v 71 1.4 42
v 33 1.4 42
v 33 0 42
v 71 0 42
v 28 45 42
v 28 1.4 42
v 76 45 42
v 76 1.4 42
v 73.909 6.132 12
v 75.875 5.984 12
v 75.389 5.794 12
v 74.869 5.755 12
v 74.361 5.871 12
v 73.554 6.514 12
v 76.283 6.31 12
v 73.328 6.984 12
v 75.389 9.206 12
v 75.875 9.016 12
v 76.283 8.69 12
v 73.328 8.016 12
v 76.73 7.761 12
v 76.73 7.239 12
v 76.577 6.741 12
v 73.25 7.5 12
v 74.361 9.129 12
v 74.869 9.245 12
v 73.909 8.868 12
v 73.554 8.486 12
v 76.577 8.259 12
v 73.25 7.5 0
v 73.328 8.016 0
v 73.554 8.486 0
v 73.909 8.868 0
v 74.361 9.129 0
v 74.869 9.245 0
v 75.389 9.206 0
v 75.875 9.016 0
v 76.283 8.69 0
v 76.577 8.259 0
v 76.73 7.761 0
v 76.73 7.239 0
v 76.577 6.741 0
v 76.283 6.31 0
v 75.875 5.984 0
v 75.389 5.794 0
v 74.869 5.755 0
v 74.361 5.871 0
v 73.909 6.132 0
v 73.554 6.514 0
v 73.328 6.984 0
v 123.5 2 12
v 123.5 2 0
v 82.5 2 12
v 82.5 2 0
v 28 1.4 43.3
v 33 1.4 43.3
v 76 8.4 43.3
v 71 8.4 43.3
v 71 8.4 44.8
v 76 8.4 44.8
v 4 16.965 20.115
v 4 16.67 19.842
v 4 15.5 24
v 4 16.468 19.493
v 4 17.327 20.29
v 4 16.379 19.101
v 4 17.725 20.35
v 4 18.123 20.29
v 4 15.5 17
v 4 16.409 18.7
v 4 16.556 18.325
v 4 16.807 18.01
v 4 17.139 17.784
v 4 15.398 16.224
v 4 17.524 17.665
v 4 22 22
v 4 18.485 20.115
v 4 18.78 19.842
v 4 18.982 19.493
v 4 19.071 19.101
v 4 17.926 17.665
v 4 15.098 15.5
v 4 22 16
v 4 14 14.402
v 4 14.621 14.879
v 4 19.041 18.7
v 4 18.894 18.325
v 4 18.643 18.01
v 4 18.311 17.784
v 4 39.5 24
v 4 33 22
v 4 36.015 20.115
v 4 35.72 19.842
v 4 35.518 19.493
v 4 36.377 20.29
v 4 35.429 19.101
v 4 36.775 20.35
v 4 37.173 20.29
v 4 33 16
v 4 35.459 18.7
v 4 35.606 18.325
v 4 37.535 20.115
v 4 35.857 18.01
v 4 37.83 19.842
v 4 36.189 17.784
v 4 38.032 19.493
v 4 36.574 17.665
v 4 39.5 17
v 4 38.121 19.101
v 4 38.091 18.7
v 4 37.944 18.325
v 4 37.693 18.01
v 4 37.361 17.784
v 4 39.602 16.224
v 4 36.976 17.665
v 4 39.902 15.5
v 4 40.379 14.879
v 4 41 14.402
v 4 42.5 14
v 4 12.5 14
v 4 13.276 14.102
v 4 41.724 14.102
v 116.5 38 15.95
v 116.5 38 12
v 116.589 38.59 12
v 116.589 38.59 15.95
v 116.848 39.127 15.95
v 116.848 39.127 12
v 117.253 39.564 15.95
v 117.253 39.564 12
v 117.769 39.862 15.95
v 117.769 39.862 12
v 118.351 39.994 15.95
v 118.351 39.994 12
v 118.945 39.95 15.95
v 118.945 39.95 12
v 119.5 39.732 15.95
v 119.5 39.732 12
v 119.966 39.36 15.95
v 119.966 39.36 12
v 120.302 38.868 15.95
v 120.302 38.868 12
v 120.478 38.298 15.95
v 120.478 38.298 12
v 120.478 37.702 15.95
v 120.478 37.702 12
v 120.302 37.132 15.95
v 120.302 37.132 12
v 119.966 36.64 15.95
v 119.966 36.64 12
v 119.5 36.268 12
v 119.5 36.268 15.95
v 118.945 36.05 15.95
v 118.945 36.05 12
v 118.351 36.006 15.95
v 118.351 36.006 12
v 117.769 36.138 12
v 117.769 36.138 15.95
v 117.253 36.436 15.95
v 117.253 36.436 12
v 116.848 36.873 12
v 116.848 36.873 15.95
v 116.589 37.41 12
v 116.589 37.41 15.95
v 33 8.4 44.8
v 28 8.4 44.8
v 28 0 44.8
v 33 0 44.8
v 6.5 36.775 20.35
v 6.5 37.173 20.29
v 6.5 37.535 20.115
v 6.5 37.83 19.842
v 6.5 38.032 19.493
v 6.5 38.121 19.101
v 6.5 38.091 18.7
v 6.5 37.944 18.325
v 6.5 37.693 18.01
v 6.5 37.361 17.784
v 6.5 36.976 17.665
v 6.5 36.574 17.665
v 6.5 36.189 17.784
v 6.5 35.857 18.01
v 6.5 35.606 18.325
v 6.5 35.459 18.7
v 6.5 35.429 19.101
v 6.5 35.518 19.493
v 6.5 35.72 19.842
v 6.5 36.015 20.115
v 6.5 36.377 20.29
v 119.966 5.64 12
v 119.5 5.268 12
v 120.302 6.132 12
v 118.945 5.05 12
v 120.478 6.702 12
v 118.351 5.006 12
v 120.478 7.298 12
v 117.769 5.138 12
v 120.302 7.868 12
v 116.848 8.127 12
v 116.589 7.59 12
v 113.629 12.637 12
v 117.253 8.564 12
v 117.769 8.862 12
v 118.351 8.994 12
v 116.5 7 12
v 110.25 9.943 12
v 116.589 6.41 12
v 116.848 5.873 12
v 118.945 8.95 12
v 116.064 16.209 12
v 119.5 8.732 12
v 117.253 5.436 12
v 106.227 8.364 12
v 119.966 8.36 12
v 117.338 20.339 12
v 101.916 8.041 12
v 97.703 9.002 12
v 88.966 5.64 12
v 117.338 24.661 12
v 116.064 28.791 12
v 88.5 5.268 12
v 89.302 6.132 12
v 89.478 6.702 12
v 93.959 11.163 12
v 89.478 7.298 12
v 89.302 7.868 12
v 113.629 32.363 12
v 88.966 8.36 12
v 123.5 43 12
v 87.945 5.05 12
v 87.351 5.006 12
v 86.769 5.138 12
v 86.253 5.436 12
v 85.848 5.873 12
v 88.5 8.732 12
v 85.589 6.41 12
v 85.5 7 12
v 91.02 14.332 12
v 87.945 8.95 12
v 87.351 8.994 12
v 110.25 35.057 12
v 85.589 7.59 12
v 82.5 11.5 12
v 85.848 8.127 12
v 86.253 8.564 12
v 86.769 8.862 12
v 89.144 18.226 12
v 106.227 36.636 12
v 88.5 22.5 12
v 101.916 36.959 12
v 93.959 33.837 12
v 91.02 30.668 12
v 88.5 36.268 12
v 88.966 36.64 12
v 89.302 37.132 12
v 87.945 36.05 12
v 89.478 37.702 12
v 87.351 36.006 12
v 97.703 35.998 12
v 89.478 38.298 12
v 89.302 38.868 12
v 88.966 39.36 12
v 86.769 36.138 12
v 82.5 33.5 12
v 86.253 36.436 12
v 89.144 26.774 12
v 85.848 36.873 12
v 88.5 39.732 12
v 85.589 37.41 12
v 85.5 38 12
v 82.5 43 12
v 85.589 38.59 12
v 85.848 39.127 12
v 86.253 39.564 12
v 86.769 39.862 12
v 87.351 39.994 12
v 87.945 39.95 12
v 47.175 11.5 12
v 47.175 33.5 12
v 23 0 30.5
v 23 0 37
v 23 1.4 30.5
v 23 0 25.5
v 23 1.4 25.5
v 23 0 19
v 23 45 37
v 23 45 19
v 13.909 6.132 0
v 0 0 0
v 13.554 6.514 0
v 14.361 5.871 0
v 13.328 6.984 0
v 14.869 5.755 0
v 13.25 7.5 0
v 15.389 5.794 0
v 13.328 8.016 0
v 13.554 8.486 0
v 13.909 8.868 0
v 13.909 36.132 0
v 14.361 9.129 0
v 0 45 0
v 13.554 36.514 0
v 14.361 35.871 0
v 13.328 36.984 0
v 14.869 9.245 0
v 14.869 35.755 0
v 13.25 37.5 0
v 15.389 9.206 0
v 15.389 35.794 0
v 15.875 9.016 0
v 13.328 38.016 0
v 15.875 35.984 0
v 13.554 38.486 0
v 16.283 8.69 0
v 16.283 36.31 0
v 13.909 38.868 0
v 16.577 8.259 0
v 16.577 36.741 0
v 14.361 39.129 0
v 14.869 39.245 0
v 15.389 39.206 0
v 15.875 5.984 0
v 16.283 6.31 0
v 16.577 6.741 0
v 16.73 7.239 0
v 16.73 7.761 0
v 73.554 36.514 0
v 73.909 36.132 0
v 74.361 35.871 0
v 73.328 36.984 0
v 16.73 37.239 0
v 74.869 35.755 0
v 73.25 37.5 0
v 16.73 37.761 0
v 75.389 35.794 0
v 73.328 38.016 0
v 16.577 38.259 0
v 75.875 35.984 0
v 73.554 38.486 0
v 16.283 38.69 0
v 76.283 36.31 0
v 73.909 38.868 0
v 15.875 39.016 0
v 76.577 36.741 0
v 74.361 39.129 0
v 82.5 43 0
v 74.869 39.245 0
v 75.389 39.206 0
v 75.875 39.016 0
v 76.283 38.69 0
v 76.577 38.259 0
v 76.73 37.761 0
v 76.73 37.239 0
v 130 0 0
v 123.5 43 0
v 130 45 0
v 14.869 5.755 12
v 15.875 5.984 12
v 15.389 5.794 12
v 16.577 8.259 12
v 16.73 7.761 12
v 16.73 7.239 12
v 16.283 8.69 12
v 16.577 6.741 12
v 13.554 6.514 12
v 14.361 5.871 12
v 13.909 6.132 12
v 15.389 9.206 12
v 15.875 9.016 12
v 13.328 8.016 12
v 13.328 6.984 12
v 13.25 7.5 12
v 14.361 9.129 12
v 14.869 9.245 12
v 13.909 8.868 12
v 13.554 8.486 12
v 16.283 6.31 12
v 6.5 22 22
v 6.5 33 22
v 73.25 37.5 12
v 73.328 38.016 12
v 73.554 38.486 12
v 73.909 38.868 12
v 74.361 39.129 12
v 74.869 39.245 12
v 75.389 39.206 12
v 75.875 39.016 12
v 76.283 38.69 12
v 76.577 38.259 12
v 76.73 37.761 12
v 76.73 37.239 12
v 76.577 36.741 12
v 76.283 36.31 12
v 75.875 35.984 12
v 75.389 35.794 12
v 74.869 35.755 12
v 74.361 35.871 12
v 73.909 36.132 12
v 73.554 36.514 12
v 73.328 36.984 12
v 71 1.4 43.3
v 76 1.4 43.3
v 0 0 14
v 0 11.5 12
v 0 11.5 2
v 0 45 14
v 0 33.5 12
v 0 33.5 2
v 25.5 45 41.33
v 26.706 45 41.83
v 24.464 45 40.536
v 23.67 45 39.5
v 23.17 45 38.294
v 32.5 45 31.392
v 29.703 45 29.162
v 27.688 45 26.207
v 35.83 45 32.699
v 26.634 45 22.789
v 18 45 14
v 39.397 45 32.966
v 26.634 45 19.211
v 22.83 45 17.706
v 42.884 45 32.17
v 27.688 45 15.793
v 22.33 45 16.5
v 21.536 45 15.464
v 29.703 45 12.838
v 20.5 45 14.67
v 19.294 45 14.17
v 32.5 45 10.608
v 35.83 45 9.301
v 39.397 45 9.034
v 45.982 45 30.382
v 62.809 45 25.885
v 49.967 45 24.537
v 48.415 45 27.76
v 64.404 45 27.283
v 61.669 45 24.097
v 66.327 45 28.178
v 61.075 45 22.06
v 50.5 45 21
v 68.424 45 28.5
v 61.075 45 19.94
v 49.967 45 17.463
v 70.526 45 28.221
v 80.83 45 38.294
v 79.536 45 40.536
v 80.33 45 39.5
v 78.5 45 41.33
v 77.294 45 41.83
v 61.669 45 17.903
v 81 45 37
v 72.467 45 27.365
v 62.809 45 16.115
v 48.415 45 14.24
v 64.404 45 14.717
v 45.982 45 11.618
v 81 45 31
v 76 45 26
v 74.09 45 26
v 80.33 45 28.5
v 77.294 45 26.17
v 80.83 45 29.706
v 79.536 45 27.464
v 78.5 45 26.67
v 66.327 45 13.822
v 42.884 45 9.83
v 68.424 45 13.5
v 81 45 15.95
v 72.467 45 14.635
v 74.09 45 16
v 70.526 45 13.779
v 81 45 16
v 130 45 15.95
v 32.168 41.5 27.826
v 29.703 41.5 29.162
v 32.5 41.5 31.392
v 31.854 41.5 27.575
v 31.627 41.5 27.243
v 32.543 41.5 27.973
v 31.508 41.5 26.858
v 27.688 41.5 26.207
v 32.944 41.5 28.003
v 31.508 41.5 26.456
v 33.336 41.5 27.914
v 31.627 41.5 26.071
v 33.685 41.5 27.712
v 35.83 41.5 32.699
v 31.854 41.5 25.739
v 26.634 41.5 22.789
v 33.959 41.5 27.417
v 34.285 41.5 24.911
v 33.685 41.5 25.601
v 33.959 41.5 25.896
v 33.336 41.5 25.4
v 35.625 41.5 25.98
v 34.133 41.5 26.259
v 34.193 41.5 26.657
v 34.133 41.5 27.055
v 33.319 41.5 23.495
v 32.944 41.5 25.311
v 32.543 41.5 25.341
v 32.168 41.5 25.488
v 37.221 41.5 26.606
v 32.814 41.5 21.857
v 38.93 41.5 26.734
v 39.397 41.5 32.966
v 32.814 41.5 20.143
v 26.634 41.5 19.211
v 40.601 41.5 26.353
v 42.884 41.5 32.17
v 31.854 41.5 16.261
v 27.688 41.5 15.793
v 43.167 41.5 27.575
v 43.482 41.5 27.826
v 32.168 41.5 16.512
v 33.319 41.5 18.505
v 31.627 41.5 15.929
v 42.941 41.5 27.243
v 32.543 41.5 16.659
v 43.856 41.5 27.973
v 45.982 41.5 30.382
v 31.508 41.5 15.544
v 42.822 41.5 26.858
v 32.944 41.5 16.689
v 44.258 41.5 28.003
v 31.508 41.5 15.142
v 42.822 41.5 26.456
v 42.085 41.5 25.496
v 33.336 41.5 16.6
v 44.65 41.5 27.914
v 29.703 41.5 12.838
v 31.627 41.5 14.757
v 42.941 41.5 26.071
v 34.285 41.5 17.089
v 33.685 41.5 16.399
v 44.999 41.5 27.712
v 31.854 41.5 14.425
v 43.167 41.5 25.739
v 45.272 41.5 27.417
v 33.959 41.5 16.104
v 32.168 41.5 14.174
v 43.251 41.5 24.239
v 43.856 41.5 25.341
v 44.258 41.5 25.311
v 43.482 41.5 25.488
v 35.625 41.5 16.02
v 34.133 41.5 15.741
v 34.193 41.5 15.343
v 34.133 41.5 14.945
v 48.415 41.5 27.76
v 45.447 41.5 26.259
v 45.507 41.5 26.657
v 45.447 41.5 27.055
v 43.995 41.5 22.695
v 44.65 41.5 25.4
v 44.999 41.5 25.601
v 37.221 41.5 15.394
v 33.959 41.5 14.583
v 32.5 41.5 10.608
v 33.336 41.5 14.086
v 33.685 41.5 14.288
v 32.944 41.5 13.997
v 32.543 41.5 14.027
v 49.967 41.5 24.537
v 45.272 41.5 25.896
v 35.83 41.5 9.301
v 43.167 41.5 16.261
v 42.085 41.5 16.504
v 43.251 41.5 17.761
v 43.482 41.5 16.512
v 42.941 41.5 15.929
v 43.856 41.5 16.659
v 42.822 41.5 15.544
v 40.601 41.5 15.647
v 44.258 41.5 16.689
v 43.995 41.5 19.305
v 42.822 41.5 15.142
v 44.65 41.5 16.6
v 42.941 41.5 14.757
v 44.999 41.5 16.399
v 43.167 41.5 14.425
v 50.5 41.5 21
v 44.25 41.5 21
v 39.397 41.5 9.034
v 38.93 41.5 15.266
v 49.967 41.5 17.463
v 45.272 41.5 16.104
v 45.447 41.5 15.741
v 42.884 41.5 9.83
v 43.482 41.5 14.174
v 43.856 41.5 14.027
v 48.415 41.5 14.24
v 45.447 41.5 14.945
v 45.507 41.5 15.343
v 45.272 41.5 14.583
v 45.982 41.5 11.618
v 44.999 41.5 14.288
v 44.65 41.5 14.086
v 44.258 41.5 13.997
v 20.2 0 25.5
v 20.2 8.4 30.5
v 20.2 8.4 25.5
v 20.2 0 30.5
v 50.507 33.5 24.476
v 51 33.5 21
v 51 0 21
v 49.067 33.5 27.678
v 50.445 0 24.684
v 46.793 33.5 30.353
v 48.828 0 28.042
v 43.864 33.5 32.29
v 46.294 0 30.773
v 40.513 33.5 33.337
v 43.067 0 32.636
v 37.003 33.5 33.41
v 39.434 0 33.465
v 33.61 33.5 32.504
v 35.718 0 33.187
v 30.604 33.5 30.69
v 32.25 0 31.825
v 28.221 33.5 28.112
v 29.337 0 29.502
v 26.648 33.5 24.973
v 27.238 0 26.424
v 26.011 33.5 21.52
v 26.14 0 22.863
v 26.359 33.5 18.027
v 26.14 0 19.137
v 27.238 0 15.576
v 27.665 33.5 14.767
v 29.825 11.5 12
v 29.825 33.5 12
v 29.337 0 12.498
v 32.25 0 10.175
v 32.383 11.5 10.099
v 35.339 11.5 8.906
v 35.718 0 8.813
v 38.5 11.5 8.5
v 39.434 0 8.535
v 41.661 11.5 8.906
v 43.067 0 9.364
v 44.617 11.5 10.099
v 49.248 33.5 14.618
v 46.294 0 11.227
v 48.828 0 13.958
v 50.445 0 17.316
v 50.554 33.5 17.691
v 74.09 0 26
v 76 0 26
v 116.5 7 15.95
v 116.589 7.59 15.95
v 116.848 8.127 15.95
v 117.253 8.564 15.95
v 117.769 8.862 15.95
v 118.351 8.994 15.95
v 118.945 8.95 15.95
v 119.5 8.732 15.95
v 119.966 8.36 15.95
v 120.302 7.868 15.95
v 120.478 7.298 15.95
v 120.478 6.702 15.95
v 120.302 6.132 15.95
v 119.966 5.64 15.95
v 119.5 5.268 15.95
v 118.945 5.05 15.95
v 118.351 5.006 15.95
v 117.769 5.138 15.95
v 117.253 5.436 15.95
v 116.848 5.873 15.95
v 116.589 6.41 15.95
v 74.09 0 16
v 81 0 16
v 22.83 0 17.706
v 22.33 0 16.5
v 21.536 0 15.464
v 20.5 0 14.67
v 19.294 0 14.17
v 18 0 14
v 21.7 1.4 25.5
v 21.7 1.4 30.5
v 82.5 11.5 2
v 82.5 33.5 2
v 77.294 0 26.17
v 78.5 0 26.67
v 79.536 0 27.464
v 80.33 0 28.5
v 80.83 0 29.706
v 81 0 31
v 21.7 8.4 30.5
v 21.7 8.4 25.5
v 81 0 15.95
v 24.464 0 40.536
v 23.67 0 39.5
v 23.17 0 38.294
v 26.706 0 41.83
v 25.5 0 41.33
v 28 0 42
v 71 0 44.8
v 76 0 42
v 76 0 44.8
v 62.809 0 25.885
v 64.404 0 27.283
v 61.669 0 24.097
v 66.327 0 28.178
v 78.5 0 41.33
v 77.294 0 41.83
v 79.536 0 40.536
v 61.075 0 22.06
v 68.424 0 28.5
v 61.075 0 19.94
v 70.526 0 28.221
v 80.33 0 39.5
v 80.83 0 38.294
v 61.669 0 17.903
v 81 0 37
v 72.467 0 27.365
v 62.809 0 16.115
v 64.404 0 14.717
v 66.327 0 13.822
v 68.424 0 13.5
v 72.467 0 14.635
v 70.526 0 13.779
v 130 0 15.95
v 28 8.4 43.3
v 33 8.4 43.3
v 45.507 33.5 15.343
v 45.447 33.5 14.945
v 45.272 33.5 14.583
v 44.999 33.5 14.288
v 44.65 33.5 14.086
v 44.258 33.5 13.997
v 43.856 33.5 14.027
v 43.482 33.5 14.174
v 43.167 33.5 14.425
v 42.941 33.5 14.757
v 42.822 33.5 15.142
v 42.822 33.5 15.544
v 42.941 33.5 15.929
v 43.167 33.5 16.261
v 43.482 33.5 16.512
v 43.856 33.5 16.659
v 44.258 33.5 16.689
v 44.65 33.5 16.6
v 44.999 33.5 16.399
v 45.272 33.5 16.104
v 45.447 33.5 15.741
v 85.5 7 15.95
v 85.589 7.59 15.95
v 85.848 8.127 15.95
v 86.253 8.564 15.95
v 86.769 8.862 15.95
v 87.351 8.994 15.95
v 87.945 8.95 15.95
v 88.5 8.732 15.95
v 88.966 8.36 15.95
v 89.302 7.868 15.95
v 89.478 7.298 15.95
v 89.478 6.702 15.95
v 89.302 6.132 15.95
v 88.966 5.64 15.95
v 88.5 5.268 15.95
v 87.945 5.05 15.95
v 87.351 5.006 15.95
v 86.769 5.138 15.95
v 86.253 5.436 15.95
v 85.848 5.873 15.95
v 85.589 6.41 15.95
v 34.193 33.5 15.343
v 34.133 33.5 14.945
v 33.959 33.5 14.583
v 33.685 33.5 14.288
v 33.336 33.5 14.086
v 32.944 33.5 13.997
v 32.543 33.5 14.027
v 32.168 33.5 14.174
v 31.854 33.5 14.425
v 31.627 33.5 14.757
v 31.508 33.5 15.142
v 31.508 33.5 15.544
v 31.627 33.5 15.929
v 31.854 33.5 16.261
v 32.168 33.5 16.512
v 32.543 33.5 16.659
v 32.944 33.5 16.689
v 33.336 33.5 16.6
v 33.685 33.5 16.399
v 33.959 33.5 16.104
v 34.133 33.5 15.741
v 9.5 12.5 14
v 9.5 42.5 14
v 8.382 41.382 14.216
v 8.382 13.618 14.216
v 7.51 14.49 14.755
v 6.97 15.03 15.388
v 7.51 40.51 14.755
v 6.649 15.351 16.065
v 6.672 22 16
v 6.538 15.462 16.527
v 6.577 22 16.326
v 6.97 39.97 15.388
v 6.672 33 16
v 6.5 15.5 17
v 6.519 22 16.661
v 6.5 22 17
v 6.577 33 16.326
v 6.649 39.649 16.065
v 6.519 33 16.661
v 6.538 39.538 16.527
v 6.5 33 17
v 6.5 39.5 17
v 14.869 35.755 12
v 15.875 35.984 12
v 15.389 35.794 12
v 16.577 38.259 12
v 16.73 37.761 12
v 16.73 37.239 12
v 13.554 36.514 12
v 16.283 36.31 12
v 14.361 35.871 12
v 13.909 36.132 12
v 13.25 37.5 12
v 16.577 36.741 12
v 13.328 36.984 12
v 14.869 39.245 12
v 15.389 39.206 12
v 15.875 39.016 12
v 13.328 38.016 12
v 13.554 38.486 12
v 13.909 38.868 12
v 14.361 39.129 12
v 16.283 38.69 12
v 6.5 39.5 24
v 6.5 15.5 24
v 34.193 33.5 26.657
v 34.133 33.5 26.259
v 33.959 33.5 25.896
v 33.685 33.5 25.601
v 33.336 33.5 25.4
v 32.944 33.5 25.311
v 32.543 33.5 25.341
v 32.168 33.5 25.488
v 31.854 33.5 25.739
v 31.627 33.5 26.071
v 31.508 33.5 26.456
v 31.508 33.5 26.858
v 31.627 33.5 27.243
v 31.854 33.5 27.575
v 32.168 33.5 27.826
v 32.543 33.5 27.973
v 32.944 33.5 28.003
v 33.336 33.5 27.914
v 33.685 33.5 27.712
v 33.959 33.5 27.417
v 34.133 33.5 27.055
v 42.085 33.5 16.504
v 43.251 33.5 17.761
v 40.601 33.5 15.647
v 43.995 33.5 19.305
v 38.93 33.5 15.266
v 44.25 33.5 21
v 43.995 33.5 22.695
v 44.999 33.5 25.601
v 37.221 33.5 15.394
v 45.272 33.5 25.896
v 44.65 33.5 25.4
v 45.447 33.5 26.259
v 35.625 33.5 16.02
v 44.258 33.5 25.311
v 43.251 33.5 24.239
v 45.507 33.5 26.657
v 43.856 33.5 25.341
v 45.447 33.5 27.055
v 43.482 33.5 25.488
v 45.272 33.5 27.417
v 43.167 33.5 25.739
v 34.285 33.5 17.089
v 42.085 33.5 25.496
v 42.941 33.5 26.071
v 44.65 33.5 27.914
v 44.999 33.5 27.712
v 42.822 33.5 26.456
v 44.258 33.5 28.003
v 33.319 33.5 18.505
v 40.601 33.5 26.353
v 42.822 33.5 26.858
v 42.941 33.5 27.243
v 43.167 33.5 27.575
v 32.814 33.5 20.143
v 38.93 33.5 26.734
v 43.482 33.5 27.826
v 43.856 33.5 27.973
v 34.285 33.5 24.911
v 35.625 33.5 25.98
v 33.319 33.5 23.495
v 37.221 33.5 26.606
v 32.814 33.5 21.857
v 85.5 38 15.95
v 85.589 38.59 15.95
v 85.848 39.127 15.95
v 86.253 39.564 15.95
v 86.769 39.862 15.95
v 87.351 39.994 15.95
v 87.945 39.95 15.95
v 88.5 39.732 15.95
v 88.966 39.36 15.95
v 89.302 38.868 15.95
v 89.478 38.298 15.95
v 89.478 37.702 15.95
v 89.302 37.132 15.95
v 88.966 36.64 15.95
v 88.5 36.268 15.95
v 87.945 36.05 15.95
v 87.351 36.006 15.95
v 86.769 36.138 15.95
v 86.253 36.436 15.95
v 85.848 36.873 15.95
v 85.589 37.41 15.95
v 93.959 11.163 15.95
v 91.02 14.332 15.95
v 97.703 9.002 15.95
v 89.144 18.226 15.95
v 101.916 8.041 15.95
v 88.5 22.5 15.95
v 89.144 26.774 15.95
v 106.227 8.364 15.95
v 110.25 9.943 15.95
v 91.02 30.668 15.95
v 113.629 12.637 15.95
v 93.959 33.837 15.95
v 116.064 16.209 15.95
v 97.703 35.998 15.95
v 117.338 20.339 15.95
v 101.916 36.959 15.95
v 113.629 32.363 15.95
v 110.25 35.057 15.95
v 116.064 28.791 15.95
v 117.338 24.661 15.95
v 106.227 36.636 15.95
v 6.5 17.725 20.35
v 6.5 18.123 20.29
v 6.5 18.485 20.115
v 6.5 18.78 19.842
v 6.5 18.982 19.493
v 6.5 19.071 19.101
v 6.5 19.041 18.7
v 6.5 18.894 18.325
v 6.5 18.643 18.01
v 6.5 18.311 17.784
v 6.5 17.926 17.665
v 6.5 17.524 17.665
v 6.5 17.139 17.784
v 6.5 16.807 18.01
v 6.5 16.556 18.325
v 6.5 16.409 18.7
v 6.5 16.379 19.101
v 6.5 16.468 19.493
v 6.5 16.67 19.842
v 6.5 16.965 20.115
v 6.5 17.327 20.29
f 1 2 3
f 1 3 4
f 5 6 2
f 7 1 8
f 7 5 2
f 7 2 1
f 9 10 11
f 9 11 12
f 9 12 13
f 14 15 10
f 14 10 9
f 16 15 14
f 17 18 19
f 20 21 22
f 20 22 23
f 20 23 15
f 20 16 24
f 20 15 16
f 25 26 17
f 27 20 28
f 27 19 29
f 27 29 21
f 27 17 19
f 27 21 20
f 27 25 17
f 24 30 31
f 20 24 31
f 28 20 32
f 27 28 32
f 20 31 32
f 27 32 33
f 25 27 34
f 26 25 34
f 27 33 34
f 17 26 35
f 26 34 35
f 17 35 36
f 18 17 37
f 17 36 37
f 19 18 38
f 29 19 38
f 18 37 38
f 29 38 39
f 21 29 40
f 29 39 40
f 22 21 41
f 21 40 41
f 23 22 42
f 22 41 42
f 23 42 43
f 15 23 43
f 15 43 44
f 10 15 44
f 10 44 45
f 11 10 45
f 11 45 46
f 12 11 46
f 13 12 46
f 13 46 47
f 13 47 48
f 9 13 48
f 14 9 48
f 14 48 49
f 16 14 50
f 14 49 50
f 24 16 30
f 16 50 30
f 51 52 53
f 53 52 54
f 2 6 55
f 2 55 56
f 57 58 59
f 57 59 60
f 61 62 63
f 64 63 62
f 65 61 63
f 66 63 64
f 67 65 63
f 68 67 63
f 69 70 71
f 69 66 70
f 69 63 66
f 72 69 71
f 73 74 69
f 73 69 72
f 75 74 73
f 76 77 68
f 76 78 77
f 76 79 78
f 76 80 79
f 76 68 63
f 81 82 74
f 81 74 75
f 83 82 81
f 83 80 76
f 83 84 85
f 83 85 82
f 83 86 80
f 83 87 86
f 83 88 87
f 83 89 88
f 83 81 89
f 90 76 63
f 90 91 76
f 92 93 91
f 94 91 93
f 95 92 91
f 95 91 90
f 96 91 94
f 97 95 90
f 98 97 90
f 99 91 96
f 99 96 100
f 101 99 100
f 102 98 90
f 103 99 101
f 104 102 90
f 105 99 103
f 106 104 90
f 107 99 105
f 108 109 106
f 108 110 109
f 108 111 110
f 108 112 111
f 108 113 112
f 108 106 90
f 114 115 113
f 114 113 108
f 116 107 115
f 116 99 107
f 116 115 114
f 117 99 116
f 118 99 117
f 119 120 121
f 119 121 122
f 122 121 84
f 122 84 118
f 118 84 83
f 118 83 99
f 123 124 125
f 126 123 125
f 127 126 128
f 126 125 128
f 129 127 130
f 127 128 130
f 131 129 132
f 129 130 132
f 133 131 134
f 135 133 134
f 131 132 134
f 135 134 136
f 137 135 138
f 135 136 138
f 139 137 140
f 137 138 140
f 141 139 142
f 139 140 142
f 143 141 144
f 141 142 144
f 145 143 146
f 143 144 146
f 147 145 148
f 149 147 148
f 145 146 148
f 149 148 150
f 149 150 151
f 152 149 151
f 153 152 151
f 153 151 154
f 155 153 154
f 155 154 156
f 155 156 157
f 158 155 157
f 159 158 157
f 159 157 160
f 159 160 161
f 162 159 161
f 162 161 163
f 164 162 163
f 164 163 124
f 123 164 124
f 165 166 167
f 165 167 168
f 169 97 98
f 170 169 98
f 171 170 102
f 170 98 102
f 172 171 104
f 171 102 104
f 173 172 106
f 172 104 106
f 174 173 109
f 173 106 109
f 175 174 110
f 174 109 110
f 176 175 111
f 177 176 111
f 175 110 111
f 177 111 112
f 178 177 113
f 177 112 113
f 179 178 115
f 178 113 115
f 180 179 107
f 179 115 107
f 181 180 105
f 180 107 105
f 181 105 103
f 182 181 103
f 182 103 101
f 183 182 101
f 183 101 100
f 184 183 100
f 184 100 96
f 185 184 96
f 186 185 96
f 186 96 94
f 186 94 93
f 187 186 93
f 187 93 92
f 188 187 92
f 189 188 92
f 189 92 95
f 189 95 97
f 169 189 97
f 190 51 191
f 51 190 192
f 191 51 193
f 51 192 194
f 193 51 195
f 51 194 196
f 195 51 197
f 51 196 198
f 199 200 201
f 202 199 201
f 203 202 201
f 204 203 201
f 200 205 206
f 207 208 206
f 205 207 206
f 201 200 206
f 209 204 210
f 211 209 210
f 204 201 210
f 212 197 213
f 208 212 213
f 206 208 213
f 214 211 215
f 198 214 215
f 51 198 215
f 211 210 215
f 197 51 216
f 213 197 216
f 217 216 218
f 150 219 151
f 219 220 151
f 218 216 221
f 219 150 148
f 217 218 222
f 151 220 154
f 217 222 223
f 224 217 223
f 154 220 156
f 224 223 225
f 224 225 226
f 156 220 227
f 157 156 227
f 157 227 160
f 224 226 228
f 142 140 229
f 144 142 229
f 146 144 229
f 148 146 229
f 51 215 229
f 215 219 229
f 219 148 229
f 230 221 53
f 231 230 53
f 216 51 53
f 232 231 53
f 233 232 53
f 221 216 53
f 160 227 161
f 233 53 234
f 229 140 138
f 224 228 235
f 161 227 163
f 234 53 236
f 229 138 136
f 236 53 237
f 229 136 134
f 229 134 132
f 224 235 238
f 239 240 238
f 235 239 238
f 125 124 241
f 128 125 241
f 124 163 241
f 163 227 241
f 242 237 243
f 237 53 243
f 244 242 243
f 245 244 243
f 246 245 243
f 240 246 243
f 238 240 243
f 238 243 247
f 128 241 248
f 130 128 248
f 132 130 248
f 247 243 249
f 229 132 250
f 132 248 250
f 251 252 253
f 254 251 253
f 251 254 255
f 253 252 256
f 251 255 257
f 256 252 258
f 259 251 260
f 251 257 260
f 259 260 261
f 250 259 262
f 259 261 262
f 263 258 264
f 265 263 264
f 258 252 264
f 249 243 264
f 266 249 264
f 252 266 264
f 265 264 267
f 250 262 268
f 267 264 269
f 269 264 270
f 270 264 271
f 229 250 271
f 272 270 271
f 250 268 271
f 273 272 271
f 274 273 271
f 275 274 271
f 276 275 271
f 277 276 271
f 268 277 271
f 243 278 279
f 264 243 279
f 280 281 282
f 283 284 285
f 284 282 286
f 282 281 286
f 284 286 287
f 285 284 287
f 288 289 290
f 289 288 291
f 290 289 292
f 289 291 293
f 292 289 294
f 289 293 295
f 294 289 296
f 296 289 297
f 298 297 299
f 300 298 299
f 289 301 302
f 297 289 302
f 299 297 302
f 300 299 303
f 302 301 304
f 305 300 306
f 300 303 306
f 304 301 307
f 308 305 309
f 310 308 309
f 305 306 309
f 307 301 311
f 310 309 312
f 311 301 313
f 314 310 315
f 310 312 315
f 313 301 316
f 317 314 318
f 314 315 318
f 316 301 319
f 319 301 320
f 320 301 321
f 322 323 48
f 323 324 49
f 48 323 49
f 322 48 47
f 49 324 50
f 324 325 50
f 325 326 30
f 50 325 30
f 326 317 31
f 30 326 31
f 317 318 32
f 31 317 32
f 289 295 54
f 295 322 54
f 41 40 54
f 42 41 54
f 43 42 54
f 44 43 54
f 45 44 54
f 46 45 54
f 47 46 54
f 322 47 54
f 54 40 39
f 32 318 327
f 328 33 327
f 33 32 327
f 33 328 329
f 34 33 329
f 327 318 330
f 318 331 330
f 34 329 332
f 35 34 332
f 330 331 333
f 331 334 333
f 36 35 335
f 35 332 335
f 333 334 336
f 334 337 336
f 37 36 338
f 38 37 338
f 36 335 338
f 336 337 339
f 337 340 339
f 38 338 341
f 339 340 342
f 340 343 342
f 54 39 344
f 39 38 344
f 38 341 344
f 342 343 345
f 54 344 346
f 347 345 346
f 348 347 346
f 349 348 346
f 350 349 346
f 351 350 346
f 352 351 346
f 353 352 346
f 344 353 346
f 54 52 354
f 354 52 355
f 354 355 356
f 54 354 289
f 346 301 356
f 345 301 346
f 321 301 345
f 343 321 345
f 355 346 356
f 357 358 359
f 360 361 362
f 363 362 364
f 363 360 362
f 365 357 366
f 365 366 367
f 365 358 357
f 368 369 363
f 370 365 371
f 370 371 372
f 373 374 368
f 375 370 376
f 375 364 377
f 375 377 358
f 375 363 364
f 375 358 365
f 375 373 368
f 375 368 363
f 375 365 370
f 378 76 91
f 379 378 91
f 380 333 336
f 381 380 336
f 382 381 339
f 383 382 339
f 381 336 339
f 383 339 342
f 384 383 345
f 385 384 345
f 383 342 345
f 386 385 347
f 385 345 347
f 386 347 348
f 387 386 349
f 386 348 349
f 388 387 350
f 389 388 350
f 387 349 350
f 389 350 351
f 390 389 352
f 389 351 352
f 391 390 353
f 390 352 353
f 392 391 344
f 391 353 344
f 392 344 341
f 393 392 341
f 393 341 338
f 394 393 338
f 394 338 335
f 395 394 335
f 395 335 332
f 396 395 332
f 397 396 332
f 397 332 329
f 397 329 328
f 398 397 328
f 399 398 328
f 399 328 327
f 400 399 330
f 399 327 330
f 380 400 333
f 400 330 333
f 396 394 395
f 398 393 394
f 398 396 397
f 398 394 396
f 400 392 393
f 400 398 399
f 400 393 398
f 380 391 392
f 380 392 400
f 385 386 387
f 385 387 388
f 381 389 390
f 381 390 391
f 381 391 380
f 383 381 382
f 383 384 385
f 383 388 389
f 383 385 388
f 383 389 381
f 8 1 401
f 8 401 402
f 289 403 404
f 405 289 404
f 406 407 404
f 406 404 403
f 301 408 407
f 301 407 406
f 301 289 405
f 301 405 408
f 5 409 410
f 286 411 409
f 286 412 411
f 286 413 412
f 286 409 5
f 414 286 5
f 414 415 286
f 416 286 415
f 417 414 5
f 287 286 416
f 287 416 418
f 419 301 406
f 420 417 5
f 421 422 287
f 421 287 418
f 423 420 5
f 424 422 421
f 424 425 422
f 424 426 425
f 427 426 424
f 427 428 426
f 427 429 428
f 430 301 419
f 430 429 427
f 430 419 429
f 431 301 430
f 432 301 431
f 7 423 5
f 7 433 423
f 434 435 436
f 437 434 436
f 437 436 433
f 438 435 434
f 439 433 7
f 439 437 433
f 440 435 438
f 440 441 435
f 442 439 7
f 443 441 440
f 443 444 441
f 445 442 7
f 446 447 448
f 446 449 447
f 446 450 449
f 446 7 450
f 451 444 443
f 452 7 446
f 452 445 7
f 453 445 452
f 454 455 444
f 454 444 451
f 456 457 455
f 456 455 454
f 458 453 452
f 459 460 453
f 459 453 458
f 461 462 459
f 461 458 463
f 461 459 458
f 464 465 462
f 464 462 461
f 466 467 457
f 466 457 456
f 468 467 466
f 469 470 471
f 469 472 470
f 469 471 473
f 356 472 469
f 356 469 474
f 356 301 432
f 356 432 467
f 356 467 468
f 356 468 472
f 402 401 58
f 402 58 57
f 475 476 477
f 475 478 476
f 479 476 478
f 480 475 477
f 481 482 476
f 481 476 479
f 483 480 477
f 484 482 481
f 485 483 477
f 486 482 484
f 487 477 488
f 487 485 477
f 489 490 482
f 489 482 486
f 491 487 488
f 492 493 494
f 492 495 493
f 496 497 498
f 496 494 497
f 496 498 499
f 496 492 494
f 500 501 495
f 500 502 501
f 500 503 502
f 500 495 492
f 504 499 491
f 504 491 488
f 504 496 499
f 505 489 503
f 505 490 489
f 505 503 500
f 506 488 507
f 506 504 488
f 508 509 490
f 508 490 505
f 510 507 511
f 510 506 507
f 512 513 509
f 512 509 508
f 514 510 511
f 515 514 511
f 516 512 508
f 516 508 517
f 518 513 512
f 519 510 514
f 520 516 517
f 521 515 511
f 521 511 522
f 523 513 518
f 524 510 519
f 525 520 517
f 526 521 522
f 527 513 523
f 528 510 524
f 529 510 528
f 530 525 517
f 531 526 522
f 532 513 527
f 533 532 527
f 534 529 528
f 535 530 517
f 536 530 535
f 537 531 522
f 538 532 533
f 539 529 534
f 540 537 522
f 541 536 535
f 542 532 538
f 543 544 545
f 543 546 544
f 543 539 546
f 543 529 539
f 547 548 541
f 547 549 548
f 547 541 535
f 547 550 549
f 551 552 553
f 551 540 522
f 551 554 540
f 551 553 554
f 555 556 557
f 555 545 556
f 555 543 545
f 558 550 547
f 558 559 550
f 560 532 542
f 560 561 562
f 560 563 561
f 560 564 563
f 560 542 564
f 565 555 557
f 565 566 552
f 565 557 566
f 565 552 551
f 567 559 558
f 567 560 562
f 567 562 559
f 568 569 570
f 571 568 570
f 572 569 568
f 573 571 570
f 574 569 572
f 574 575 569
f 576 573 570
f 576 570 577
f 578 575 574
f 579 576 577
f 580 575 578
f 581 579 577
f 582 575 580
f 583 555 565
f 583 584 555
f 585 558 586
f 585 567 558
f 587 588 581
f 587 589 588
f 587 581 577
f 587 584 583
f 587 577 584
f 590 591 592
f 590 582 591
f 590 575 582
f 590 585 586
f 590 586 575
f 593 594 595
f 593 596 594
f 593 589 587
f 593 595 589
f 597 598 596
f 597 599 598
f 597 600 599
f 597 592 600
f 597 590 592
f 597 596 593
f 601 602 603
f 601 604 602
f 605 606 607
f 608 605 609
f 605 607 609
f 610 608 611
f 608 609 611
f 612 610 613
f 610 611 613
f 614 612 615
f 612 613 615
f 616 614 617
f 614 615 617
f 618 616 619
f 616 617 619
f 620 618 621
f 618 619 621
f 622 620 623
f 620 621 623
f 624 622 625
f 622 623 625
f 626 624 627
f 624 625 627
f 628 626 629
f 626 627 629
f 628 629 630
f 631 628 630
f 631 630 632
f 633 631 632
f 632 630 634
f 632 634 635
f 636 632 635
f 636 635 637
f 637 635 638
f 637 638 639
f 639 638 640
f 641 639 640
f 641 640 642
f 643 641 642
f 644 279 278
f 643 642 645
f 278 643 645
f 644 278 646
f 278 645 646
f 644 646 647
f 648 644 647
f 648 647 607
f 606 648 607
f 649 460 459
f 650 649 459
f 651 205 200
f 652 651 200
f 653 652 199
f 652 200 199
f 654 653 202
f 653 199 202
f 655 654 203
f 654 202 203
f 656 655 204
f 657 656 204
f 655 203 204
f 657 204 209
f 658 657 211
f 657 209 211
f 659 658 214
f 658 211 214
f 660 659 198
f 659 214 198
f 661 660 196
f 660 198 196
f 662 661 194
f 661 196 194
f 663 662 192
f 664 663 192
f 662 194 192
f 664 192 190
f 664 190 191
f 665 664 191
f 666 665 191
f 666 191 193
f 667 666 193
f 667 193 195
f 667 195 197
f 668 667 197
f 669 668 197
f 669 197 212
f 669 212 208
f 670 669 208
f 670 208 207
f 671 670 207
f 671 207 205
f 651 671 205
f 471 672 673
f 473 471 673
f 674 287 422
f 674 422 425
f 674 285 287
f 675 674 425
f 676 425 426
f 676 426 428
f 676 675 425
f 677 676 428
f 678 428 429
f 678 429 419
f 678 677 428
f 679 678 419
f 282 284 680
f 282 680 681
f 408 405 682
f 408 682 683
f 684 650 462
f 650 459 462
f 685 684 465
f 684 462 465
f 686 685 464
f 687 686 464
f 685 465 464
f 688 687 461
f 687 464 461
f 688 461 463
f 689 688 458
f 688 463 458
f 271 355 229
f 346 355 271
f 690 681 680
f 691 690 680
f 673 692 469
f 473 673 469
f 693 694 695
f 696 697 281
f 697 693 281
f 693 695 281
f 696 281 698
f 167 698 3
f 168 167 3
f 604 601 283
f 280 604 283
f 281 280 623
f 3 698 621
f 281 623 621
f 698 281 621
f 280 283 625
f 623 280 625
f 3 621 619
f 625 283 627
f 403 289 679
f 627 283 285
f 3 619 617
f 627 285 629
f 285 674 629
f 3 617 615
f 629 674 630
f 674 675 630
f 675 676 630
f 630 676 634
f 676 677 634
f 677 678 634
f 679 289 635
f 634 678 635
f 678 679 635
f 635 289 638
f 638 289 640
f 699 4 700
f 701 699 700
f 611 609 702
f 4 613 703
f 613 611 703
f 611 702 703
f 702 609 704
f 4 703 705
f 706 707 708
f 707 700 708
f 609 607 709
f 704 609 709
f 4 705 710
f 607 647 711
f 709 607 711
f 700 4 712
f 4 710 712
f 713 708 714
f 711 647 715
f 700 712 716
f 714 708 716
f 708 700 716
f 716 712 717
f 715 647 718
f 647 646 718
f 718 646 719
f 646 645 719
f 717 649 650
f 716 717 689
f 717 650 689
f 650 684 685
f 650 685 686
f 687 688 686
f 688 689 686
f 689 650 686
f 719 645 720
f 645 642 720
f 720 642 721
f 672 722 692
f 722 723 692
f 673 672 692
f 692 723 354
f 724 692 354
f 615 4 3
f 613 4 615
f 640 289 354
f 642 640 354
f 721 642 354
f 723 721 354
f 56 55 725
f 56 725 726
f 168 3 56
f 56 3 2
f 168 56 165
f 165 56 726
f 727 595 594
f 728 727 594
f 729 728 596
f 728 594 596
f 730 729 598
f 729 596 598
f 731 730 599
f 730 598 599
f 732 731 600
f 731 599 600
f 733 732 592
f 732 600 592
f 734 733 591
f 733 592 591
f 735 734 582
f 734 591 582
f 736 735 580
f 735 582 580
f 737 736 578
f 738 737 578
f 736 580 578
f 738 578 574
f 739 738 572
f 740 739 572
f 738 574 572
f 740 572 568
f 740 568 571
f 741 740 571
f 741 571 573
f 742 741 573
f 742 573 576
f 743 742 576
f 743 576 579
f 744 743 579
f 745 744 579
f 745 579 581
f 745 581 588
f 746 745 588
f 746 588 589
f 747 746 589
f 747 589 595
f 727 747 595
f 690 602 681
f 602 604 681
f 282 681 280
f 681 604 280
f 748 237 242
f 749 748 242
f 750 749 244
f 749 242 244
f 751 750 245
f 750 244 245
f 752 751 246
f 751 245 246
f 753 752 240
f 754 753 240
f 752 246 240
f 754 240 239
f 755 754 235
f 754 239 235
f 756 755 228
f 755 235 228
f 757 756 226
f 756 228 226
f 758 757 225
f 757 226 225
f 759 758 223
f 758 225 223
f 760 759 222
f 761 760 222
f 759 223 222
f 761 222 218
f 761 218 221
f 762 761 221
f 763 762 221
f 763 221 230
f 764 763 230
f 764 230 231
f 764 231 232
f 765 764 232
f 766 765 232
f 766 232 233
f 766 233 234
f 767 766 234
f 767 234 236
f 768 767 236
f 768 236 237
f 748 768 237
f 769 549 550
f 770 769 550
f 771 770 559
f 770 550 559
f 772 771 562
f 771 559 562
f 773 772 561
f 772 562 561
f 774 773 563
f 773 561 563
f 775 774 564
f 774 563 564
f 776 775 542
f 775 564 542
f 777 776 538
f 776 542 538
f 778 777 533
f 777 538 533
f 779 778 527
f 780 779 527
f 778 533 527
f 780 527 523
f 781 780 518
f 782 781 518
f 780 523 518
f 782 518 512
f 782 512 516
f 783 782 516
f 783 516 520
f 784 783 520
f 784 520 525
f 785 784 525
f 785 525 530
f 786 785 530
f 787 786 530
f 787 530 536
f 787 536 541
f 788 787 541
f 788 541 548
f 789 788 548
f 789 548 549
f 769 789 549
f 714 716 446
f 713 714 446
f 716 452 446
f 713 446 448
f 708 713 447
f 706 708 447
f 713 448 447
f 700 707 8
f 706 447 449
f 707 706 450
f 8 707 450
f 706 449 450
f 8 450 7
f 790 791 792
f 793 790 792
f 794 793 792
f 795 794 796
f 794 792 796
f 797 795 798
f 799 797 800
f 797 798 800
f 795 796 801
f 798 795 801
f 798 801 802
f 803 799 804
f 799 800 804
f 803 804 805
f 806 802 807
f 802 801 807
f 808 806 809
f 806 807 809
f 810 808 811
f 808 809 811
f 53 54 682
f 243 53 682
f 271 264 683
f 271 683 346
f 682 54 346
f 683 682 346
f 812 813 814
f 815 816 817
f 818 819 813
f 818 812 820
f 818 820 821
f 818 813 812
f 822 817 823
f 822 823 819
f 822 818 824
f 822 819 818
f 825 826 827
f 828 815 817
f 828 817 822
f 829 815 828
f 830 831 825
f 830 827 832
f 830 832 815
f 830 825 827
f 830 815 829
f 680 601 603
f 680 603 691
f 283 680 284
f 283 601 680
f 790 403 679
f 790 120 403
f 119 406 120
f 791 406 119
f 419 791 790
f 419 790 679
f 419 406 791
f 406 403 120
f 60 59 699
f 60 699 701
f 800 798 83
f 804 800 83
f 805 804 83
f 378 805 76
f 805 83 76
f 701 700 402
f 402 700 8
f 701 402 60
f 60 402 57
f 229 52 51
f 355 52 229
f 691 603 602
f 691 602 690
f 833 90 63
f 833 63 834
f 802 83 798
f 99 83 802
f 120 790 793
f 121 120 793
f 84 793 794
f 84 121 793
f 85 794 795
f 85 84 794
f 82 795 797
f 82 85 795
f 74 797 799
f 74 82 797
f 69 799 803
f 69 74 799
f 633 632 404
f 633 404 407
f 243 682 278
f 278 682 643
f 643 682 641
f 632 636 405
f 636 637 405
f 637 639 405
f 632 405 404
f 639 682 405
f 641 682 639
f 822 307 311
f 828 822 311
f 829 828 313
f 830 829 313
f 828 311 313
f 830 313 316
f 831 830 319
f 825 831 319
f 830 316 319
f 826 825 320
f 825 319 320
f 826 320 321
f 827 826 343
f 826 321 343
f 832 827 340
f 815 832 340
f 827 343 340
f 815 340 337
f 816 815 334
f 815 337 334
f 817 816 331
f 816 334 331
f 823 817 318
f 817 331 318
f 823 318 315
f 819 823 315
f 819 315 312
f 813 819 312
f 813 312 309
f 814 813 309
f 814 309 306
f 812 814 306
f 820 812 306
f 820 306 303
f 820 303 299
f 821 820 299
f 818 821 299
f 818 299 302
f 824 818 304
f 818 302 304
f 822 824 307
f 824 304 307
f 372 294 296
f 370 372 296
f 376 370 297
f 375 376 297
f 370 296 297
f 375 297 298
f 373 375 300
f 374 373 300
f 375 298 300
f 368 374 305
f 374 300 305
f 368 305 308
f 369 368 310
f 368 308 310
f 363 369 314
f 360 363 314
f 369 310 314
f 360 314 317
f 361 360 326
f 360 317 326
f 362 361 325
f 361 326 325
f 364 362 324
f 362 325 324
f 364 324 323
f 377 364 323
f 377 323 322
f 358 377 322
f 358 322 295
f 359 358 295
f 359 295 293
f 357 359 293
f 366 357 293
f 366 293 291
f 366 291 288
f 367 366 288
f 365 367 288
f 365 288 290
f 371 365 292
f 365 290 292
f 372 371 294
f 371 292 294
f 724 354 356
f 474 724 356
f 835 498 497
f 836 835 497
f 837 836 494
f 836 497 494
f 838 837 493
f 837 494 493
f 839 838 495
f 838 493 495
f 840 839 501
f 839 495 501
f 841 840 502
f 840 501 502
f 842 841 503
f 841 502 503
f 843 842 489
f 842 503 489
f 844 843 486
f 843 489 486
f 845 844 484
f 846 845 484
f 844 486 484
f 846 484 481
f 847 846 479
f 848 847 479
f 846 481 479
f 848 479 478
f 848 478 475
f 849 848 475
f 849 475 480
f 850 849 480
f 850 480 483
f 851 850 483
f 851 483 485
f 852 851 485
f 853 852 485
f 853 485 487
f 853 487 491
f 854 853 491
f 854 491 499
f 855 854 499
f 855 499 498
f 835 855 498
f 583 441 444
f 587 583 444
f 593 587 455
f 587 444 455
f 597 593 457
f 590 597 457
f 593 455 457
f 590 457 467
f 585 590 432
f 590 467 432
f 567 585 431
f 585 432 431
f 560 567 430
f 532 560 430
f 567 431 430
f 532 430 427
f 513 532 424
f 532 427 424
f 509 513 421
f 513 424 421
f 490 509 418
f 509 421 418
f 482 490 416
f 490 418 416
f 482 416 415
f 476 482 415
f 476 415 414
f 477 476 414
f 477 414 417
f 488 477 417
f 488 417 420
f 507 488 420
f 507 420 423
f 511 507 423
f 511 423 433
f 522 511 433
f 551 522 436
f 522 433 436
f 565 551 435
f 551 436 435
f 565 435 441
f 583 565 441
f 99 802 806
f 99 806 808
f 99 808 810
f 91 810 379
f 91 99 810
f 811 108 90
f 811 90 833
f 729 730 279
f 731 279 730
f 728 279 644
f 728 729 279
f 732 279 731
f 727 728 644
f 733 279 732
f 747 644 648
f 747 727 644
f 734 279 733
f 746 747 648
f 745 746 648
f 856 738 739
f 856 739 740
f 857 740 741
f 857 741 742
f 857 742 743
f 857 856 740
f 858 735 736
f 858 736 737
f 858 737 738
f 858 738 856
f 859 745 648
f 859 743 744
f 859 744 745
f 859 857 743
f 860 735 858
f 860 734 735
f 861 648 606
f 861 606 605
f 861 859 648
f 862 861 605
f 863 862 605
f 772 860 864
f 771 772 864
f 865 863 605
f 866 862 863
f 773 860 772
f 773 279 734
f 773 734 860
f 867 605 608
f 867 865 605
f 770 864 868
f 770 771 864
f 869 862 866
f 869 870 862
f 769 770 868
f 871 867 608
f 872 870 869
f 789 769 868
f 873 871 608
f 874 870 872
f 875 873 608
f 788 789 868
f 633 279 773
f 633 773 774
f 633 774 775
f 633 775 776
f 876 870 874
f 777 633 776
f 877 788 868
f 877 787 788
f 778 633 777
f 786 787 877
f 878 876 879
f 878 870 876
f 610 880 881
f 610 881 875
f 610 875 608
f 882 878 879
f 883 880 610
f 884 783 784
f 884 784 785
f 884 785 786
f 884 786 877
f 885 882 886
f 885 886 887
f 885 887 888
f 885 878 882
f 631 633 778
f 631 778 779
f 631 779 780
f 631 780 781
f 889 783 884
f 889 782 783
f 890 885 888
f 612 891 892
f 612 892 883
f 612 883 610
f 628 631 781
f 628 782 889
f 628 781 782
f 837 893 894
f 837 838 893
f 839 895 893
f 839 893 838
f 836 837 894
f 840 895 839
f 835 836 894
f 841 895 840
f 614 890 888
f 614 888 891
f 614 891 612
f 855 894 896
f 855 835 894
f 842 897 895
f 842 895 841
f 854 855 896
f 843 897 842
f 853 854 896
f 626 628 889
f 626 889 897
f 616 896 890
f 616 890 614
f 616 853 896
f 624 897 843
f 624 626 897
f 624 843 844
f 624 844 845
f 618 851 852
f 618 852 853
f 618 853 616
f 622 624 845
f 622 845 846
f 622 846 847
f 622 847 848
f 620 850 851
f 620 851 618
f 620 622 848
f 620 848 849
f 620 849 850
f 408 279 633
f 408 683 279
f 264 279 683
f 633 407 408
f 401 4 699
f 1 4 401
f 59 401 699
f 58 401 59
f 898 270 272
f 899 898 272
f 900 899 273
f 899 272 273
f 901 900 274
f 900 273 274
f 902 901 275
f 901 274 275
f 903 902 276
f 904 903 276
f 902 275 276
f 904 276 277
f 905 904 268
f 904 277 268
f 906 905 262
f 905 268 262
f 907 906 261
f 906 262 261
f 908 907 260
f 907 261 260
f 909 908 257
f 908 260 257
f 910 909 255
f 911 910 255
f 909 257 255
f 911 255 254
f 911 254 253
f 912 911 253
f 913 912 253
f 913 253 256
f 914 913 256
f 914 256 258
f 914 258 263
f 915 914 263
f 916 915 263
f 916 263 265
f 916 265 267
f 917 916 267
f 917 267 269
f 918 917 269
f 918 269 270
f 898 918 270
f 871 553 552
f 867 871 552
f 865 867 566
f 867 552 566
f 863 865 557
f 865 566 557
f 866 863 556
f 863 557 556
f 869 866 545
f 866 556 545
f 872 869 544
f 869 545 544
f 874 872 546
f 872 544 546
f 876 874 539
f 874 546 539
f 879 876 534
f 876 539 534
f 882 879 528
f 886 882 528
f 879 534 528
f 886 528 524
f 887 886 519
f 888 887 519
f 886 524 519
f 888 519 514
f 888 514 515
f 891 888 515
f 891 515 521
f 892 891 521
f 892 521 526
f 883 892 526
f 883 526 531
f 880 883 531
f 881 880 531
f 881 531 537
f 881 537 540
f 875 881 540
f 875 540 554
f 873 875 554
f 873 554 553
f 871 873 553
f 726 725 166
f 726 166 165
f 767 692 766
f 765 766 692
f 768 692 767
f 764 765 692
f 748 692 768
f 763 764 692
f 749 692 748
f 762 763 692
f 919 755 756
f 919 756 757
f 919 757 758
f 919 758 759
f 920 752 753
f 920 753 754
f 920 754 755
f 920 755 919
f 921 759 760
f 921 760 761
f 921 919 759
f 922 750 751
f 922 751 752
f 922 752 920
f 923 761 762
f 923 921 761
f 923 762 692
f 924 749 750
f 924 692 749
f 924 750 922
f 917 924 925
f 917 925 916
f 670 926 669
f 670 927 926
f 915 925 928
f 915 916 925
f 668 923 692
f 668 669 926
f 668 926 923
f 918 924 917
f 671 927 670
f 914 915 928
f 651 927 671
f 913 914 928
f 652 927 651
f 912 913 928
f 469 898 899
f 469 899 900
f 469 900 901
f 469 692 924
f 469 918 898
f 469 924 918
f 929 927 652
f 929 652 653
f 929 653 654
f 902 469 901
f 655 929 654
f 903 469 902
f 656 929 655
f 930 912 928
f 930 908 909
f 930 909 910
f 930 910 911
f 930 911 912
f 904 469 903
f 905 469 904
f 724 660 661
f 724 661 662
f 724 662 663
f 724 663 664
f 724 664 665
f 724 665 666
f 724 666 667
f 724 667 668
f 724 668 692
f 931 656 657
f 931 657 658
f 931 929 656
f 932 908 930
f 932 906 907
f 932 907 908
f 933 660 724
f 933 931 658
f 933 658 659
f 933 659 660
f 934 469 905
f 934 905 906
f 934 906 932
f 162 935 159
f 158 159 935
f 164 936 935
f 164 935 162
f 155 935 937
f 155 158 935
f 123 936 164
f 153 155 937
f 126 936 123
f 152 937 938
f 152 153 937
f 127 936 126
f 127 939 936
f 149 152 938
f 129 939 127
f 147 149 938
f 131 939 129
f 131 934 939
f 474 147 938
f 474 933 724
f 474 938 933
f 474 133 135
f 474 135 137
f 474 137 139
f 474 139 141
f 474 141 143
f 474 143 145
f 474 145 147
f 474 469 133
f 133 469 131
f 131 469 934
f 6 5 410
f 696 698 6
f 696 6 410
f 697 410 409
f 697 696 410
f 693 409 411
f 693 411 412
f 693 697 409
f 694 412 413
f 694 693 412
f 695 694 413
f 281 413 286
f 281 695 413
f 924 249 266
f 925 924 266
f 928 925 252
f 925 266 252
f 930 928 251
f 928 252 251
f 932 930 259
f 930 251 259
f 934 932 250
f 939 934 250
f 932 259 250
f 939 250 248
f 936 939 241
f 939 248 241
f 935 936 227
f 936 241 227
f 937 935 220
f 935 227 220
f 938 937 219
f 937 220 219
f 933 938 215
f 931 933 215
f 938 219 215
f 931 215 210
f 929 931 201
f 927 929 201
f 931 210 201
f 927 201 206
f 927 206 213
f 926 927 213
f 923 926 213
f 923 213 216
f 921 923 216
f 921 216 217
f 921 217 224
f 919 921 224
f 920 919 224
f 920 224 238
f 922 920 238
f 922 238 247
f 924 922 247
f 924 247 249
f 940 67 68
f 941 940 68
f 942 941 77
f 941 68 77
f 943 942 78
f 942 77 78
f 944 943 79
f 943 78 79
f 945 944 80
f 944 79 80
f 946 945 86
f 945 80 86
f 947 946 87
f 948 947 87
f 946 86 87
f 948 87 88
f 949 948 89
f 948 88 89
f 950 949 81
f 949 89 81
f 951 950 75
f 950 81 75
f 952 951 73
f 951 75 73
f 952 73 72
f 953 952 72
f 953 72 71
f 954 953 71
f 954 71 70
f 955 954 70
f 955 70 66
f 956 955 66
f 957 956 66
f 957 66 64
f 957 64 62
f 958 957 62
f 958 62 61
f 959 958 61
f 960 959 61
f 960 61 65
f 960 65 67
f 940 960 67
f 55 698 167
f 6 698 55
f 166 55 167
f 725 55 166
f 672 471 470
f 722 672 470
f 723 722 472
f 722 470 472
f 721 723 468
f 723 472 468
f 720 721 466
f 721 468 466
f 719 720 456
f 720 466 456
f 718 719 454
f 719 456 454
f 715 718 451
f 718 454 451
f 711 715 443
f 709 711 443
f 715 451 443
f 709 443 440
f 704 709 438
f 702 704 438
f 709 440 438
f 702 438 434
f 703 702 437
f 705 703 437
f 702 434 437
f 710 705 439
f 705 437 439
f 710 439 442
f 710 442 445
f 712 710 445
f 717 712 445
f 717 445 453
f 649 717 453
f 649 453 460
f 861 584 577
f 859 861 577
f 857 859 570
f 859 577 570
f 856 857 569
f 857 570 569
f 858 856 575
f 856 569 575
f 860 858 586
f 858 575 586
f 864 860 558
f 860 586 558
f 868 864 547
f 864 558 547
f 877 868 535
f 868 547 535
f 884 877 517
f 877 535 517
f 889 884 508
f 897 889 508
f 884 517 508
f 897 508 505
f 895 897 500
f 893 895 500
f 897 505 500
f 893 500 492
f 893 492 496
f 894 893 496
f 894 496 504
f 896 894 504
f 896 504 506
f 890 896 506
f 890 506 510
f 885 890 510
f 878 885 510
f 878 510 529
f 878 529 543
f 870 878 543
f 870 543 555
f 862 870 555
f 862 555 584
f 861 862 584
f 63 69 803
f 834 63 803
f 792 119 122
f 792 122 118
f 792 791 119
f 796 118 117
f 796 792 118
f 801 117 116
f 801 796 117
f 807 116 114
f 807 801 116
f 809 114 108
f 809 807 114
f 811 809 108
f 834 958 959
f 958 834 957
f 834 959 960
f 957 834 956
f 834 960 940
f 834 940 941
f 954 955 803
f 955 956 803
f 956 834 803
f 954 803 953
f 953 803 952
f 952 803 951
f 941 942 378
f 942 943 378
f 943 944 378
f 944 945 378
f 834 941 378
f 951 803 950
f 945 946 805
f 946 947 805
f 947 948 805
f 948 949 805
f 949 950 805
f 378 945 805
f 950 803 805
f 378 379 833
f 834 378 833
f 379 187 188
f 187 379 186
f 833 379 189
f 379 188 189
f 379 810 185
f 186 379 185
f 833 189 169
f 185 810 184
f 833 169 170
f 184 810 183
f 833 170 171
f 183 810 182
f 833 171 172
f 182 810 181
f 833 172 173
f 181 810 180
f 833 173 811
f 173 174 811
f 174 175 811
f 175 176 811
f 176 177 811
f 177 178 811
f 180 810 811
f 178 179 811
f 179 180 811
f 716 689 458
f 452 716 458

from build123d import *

# Parameters (mm, degrees)
SKETCH1_W           = 130
SKETCH1_H           = 45
BOSS_EXTRUDE1_DEPTH = 42
SKETCH2_W           = 10
SKETCH2_H           = 22
CUT_EXTRUDE1_DEPTH  = 115
SKETCH3_W           = 41
SKETCH3_H           = 41
CUT_EXTRUDE2_DEPTH  = 12
CUT_EXTRUDE3_START  = -26.05
SKETCH5_W           = 49
SKETCH5_H           = 45
CUT_EXTRUDE3_DEPTH  = 26.05
SKETCH6_R           = 2
CUT_EXTRUDE4_DEPTH  = 43
SKETCH7_R           = 12
CUT_EXTRUDE5_DEPTH  = 3.5
SKETCH8_R           = 7.5
CUT_EXTRUDE6_DEPTH  = 46
SKETCH10_W          = 23
SKETCH10_H          = 28
CUT_EXTRUDE7_DEPTH  = 46
FILLET1_R           = 5
SKETCH11_R          = 5.75
CUT_EXTRUDE8_DEPTH  = 42.5
SKETCH12_R          = 1.35
CUT_EXTRUDE9_DEPTH  = 20
SKETCH14_R          = 1.75
CUT_EXTRUDE11_DEPTH = 12
SKETCH15_W          = 32.462008986
SKETCH15_H          = 10
CUT_EXTRUDE12_DEPTH = 46
FILLET2_R           = 5
FILLET3_R           = 5
SKETCH16_R          = 12.5
CUT_EXTRUDE13_DEPTH = 33.5
SKETCH17_W          = 2.5
SKETCH17_H          = 24
BOSS_EXTRUDE2_DEPTH = 10
SKETCH18_R          = 1.35
CUT_EXTRUDE14_DEPTH = 10
FILLET4_R           = 3
FILLET5_R           = 3
SKETCH20_W          = 5
SKETCH20_H          = 1.4
BOSS_EXTRUDE3_DEPTH = 2.8
SKETCH22_W          = 5
SKETCH22_H          = 1.4
BOSS_EXTRUDE4_DEPTH = 2.8
SKETCH25_W          = 1.5
SKETCH25_H          = 5
SKETCH25_W_2        = 5
SKETCH25_H_2        = 1.5
BOSS_EXTRUDE5_DEPTH = 7
SKETCH26_R          = 14.5
CUT_EXTRUDE15_DEPTH = 10
SKETCH27_W          = 6
SKETCH27_H          = 11
CUT_EXTRUDE16_DEPTH = 10


with BuildPart() as part:
    # Sketch1 → Boss-Extrude1 (new body)
    with BuildSketch(Plane.XY):
        with Locations((65, 22.5)):
            Rectangle(SKETCH1_W, SKETCH1_H)
    extrude(amount=BOSS_EXTRUDE1_DEPTH)

    # Sketch2 → Cut-Extrude1 (cut)
    with BuildSketch(Plane.ZY):
        with Locations((7, 22.5)):
            Rectangle(SKETCH2_W, SKETCH2_H)
    extrude(amount=-CUT_EXTRUDE1_DEPTH, mode=Mode.SUBTRACT)

    # Sketch3 → Cut-Extrude2 (cut)
    with BuildSketch(Plane(origin=(0, 0, 0), x_dir=(-1, 0, 0), z_dir=(0, 0, -1))):
        with Locations((-103, 22.5)):
            Rectangle(SKETCH3_W, SKETCH3_H)
    extrude(amount=-CUT_EXTRUDE2_DEPTH, mode=Mode.SUBTRACT)

    # Sketch5 → Cut-Extrude3 (cut)
    with BuildSketch(Plane.XY.offset(42).offset(CUT_EXTRUDE3_START)):
        with Locations((105.5, 22.5)):
            Rectangle(SKETCH5_W, SKETCH5_H)
    extrude(amount=CUT_EXTRUDE3_DEPTH, mode=Mode.SUBTRACT)

    # Sketch6 → Cut-Extrude4 (cut, through all)
    with BuildSketch(Plane(origin=(0, 0, 0), x_dir=(-1, 0, 0), z_dir=(0, 0, -1))):
        with Locations((-118.5, 38)):
            Circle(SKETCH6_R)
        with Locations((-87.5, 38)):
            Circle(SKETCH6_R)
        with Locations((-87.5, 7)):
            Circle(SKETCH6_R)
        with Locations((-118.5, 7)):
            Circle(SKETCH6_R)
    extrude(amount=-CUT_EXTRUDE4_DEPTH, mode=Mode.SUBTRACT)

    # Sketch7 → Cut-Extrude5 (cut)
    with BuildSketch(Plane(origin=(0, 45, 0), x_dir=(1, 0, 0), z_dir=(0, 1, 0))):
        with Locations((38.5, -21)):
            Circle(SKETCH7_R)
    extrude(amount=-CUT_EXTRUDE5_DEPTH, mode=Mode.SUBTRACT)

    # Sketch8 → Cut-Extrude6 (cut, through all)
    with BuildSketch(Plane(origin=(0, 45, 0), x_dir=(1, 0, 0), z_dir=(0, 1, 0))):
        with Locations((68.5, -21)):
            Circle(SKETCH8_R)
    extrude(amount=-CUT_EXTRUDE6_DEPTH, mode=Mode.SUBTRACT)

    # Sketch10 → Cut-Extrude7 (cut, through all)
    with BuildSketch(Plane(origin=(0, 45, 0), x_dir=(1, 0, 0), z_dir=(0, 1, 0))):
        with Locations((11.5, -28)):
            Rectangle(SKETCH10_W, SKETCH10_H)
    extrude(amount=-CUT_EXTRUDE7_DEPTH, mode=Mode.SUBTRACT)

    # Fillet1
    fillet1_edges = [part.edges().sort_by_distance(p)[0] for p in [
        (23, 22.5, 42),
        (81, 22.5, 42),
    ]]
    fillet(fillet1_edges, radius=FILLET1_R)

    # Sketch11 → Cut-Extrude8 (cut, through all)
    with BuildSketch(Plane(origin=(0, 41.5, 0), x_dir=(1, 0, 0), z_dir=(0, 1, 0))):
        with Locations((38.5, -21)):
            Circle(SKETCH11_R)
    extrude(amount=-CUT_EXTRUDE8_DEPTH, mode=Mode.SUBTRACT)

    # Sketch12 → Cut-Extrude9 (cut)
    with BuildSketch(Plane(origin=(0, 41.5, 0), x_dir=(1, 0, 0), z_dir=(0, 1, 0))):
        with Locations((32.843145751, -15.343145751)):
            Circle(SKETCH12_R)
        with Locations((44.156854249, -15.343145751)):
            Circle(SKETCH12_R)
        with Locations((44.156854249, -26.656854249)):
            Circle(SKETCH12_R)
        with Locations((32.843145751, -26.656854249)):
            Circle(SKETCH12_R)
    extrude(amount=-CUT_EXTRUDE9_DEPTH, mode=Mode.SUBTRACT)

    # Sketch14 → Cut-Extrude11 (cut)
    with BuildSketch(Plane(origin=(0, 0, 0), x_dir=(-1, 0, 0), z_dir=(0, 0, -1))):
        with Locations((-75, 37.5)):
            Circle(SKETCH14_R)
        with Locations((-15, 37.5)):
            Circle(SKETCH14_R)
        with Locations((-15, 7.5)):
            Circle(SKETCH14_R)
        with Locations((-75, 7.5)):
            Circle(SKETCH14_R)
    extrude(amount=-CUT_EXTRUDE11_DEPTH, mode=Mode.SUBTRACT)

    # Sketch15 → Cut-Extrude12 (cut, through all)
    with BuildSketch(Plane(origin=(0, 45, 0), x_dir=(1, 0, 0), z_dir=(0, 1, 0))):
        with Locations((82.343987658, -21)):
            Rectangle(SKETCH15_W, SKETCH15_H)
    extrude(amount=-CUT_EXTRUDE12_DEPTH, mode=Mode.SUBTRACT)

    # Fillet2
    fillet2_edges = [part.edges().sort_by_distance(p)[0] for p in [
        (81, 22.5, 26),
    ]]
    fillet(fillet2_edges, radius=FILLET2_R)

    # Fillet3
    fillet3_edges = [part.edges().sort_by_distance(p)[0] for p in [
        (23, 22.5, 14),
    ]]
    fillet(fillet3_edges, radius=FILLET3_R)

    # Sketch16 → Cut-Extrude13 (cut)
    with BuildSketch(Plane.XZ):
        with Locations((38.5, 21)):
            Circle(SKETCH16_R)
    extrude(amount=-CUT_EXTRUDE13_DEPTH, mode=Mode.SUBTRACT)

    # Sketch17 → Boss-Extrude2 (add)
    with BuildSketch(Plane.XY.offset(14)):
        with Locations((5.25, 27.5)):
            Rectangle(SKETCH17_W, SKETCH17_H)
    extrude(amount=BOSS_EXTRUDE2_DEPTH)

    # Sketch18 → Cut-Extrude14 (cut)
    with BuildSketch(Plane.ZY.offset(-4)):
        with Locations((19, 36.775)):
            Circle(SKETCH18_R)
        with Locations((19, 17.725)):
            Circle(SKETCH18_R)
    extrude(amount=-CUT_EXTRUDE14_DEPTH, mode=Mode.SUBTRACT)

    # Fillet4
    fillet4_edges = [part.edges().sort_by_distance(p)[0] for p in [
        (6.5, 27.5, 14),
    ]]
    fillet(fillet4_edges, radius=FILLET4_R)

    # Fillet5
    fillet5_edges = [part.edges().sort_by_distance(p)[0] for p in [
        (8, 39.5, 14),
        (8, 15.5, 14),
    ]]
    fillet(fillet5_edges, radius=FILLET5_R)

    # Sketch20 → Boss-Extrude3 (add)
    with BuildSketch(Plane.XY.offset(42)):
        with Locations((30.5, 0.7)):
            Rectangle(SKETCH20_W, SKETCH20_H)
        with Locations((73.5, 0.7)):
            Rectangle(SKETCH20_W, SKETCH20_H)
    extrude(amount=BOSS_EXTRUDE3_DEPTH)

    # Sketch22 → Boss-Extrude4 (add)
    with BuildSketch(Plane.ZY.offset(-23)):
        with Locations((28, 0.7)):
            Rectangle(SKETCH22_W, SKETCH22_H)
    extrude(amount=BOSS_EXTRUDE4_DEPTH)

    # Sketch25 → Boss-Extrude5 (add)
    with BuildSketch(Plane(origin=(0, 1.4, 0), x_dir=(1, 0, 0), z_dir=(0, 1, 0))):
        with Locations((20.95, -28)):
            Rectangle(SKETCH25_W, SKETCH25_H)
        with Locations((73.5, -44.05)):
            Rectangle(SKETCH25_W_2, SKETCH25_H_2)
        with Locations((30.5, -44.05)):
            Rectangle(SKETCH25_W_2, SKETCH25_H_2)
    extrude(amount=BOSS_EXTRUDE5_DEPTH)

    # Sketch26 → Cut-Extrude15 (cut)
    with BuildSketch(Plane(origin=(0, 0, 12), x_dir=(-1, 0, 0), z_dir=(0, 0, -1))):
        with Locations((-103, 22.5)):
            Circle(SKETCH26_R)
    extrude(amount=-CUT_EXTRUDE15_DEPTH, mode=Mode.SUBTRACT)

    # Sketch27 → Cut-Extrude16 (cut)
    with BuildSketch(Plane.ZY.offset(-4)):
        with Locations((19, 27.5)):
            Rectangle(SKETCH27_W, SKETCH27_H)
    extrude(amount=-CUT_EXTRUDE16_DEPTH, mode=Mode.SUBTRACT)


solid = part.part
